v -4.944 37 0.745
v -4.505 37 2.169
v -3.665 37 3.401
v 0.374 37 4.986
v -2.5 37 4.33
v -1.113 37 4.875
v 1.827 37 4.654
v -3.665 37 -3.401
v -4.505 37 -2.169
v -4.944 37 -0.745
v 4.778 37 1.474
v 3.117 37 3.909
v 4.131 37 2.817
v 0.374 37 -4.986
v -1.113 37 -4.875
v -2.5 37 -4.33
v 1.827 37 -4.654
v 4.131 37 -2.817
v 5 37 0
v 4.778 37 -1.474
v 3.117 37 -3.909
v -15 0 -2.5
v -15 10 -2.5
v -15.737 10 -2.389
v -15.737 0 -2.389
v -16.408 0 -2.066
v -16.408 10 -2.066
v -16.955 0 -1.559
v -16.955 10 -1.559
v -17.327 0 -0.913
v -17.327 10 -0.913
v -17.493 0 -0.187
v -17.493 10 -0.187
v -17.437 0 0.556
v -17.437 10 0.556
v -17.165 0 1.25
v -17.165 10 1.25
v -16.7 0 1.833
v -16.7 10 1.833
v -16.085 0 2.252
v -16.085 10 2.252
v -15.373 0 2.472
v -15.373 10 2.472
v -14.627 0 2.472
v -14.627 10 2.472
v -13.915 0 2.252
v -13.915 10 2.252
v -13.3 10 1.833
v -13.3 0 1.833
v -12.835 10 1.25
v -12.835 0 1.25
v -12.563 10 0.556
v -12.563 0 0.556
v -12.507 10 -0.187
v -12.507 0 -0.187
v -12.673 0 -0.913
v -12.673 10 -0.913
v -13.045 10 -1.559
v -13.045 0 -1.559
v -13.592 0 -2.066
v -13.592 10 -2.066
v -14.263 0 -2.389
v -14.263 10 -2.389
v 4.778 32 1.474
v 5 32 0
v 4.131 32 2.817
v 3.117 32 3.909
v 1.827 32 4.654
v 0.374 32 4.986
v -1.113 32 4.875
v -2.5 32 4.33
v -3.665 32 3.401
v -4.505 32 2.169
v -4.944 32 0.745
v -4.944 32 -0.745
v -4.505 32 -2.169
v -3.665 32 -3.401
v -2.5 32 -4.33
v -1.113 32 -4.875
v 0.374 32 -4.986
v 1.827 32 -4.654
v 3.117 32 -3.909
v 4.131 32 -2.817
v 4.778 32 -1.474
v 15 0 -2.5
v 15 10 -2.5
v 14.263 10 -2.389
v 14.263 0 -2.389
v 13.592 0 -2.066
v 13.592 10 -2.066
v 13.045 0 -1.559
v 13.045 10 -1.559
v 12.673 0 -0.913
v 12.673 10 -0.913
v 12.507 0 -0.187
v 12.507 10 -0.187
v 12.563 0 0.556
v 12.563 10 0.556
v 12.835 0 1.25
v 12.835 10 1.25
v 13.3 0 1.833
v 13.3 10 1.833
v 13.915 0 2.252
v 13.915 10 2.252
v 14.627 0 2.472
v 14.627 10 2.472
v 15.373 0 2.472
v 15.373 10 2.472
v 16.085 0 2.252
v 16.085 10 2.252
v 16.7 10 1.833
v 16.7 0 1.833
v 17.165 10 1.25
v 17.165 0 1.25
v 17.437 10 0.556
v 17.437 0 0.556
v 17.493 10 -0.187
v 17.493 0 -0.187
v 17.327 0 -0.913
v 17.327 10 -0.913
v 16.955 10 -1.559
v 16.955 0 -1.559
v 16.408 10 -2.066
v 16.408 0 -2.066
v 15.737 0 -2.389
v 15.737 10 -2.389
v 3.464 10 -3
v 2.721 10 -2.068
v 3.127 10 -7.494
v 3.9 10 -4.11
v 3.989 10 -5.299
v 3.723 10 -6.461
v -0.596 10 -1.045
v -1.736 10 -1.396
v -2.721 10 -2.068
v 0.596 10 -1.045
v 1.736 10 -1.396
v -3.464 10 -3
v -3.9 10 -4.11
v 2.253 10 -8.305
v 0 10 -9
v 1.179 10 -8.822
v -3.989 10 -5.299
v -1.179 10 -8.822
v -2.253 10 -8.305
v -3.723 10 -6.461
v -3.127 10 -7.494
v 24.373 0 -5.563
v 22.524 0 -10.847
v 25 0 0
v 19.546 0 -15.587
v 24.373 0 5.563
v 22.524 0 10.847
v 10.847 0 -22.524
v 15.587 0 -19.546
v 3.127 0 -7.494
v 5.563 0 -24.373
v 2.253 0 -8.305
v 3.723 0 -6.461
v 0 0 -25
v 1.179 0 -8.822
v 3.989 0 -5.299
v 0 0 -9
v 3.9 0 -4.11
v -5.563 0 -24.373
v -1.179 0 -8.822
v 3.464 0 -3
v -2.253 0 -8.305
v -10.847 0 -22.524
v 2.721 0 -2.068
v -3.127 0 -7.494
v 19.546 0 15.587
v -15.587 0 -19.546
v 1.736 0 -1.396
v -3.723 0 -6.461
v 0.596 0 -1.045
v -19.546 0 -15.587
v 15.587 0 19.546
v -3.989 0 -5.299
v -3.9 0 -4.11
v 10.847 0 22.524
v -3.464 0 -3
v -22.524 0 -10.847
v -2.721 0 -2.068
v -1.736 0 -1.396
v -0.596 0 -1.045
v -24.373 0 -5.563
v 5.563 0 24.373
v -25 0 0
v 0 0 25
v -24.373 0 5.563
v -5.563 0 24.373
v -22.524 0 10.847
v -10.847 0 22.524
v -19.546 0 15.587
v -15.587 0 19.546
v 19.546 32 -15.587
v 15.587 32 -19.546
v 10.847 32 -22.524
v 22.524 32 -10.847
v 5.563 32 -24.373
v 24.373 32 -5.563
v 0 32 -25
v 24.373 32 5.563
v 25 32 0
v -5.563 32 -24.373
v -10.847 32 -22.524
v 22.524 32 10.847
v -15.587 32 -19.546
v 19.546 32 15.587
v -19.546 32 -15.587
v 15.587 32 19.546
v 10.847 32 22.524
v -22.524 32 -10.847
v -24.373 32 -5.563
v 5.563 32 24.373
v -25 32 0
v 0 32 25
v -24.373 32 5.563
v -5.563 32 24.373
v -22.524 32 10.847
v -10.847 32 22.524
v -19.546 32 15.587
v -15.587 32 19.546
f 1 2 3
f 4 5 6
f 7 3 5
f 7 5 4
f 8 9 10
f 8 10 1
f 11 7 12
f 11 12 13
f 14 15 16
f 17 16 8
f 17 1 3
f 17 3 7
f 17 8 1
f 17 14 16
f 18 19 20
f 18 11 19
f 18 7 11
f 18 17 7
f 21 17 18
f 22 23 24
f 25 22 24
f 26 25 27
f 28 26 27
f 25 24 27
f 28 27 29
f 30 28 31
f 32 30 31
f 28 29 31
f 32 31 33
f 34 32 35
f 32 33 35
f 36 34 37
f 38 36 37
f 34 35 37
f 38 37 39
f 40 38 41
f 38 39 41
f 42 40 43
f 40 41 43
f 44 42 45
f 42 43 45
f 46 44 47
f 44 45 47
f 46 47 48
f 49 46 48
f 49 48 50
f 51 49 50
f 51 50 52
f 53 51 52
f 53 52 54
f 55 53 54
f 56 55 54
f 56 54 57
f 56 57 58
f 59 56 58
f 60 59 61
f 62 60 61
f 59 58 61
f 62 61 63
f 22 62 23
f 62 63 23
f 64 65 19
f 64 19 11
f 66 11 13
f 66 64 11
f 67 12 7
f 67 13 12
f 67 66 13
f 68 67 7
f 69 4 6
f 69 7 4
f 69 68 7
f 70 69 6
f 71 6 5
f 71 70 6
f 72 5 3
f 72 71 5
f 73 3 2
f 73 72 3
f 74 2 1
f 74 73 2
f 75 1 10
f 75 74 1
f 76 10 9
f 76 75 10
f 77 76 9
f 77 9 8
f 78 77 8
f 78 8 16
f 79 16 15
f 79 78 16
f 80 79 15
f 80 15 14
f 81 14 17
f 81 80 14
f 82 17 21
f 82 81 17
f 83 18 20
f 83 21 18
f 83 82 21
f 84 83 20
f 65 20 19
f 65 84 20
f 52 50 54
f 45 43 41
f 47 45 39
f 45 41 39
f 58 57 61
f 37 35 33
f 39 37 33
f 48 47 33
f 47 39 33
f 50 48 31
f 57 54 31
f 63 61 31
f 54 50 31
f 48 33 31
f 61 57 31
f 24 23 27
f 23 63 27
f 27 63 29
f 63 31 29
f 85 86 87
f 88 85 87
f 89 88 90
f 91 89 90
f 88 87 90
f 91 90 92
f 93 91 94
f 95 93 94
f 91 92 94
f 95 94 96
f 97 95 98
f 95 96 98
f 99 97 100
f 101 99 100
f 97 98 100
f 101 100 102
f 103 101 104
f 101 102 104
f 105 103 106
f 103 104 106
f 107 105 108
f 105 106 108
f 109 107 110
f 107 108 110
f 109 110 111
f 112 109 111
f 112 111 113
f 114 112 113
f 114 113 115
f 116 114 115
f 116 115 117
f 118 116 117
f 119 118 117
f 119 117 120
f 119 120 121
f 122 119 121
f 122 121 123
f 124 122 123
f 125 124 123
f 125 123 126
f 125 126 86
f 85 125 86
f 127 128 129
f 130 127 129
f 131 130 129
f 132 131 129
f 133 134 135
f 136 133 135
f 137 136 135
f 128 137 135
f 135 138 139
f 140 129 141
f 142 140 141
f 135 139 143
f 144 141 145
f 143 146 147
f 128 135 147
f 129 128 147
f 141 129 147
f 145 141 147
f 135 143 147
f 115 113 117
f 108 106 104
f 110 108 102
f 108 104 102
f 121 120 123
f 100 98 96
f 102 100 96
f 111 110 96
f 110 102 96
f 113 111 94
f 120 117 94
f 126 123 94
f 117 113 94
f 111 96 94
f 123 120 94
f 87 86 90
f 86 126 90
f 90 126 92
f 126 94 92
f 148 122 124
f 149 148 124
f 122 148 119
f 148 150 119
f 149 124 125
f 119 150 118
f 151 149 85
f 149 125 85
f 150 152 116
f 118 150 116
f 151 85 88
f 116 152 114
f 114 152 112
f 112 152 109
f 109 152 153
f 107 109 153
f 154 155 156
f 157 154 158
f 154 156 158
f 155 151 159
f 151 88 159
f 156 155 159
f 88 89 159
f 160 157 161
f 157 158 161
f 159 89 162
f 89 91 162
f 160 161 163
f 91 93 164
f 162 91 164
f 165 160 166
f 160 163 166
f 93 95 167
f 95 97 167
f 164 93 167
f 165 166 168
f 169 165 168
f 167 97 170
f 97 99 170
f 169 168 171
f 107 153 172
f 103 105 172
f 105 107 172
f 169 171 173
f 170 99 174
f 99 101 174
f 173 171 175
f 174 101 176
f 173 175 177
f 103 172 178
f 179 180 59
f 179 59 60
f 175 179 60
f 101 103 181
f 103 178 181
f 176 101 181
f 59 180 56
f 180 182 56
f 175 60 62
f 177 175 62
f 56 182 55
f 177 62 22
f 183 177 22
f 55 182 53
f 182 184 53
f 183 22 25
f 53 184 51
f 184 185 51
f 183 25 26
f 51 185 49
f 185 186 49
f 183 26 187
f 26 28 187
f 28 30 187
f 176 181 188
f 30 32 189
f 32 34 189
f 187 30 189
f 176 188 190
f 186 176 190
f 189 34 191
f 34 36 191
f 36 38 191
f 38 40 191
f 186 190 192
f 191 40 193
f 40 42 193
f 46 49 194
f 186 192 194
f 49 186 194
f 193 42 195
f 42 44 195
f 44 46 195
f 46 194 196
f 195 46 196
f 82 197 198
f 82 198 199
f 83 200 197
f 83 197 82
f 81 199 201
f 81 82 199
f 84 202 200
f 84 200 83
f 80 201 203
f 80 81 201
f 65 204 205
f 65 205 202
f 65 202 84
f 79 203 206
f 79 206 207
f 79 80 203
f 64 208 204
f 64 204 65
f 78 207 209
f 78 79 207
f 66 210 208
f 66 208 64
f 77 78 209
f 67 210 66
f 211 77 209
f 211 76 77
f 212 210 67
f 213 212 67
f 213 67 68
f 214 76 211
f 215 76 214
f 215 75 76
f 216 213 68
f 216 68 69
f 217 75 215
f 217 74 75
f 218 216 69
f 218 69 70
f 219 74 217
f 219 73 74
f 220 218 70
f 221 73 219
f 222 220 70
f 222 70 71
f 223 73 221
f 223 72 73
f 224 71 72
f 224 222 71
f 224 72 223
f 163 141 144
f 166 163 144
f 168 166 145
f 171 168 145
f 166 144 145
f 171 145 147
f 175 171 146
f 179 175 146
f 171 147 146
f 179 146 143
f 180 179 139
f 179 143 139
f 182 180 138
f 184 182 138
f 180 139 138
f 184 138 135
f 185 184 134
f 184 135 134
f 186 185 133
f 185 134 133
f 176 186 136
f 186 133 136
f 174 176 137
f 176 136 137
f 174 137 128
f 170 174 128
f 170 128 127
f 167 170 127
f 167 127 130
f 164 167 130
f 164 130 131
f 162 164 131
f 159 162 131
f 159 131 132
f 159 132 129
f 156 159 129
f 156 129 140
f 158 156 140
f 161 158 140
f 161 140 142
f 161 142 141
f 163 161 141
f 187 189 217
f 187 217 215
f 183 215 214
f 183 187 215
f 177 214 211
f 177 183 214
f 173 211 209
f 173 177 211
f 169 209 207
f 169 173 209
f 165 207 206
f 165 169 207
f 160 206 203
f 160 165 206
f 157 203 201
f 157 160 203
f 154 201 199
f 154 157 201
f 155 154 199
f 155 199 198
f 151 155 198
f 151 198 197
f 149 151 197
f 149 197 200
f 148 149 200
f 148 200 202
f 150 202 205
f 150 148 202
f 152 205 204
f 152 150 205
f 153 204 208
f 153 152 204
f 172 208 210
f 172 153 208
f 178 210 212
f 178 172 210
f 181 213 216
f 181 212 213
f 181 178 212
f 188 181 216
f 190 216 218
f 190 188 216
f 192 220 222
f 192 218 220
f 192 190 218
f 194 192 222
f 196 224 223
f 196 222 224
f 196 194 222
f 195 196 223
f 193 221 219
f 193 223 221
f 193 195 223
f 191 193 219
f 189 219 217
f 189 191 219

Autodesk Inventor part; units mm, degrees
ref_plane "YZ Plane" through (0, 0, 0) normal (1, 0, 0) x (0, 1, 0)
ref_plane "XZ Plane" through (0, 0, 0) normal (0, 1, 0) x (-1, 0, 0)
ref_plane "XY Plane" through (0, 0, 0) normal (0, 0, 1) x (1, 0, 0)
sketch "Sketch1" plane through (0, 0, 0) normal (0, 1, 0) x (-1, 0, 0)
  circle A0 centre (0, 0) radius 25
  dimension "d0" = 50
extrude "Extrusion1" add sketch "Sketch1" along normal blind 32
sketch "Sketch2" plane through (0, 32, 0) normal (0, 1, 0) x (1, 0, 0)
  circle A0 centre (0, 0) radius 5
  dimension "d3" = 10
extrude "Extrusion2" add sketch "Sketch2" along normal blind 5
sketch "Sketch3" plane through (0, 0, 0) normal (0, -1, 0) x (1, 0, 0)
  circle A0 centre (0, 0) radius 15
  circle A1 centre (0, 0) radius 5 projected
  circle A2 centre (0, 0) radius 5
  point P0 (15, 0)
  point P1 (-15, 0)
  point P2 (0, -5)
  dimension "d7" = 10
  dimension "d6" = 30
hole "Hole1" at (15, 0, 0) at (-15, 0, 0) direction (0, 1, 0) diameter 5 depth 10
hole "Hole2" at (0, 0, -5) direction (0, 1, 0) diameter 8 depth 10
properties part number "stackLightBase" material "ABS Plastic"
